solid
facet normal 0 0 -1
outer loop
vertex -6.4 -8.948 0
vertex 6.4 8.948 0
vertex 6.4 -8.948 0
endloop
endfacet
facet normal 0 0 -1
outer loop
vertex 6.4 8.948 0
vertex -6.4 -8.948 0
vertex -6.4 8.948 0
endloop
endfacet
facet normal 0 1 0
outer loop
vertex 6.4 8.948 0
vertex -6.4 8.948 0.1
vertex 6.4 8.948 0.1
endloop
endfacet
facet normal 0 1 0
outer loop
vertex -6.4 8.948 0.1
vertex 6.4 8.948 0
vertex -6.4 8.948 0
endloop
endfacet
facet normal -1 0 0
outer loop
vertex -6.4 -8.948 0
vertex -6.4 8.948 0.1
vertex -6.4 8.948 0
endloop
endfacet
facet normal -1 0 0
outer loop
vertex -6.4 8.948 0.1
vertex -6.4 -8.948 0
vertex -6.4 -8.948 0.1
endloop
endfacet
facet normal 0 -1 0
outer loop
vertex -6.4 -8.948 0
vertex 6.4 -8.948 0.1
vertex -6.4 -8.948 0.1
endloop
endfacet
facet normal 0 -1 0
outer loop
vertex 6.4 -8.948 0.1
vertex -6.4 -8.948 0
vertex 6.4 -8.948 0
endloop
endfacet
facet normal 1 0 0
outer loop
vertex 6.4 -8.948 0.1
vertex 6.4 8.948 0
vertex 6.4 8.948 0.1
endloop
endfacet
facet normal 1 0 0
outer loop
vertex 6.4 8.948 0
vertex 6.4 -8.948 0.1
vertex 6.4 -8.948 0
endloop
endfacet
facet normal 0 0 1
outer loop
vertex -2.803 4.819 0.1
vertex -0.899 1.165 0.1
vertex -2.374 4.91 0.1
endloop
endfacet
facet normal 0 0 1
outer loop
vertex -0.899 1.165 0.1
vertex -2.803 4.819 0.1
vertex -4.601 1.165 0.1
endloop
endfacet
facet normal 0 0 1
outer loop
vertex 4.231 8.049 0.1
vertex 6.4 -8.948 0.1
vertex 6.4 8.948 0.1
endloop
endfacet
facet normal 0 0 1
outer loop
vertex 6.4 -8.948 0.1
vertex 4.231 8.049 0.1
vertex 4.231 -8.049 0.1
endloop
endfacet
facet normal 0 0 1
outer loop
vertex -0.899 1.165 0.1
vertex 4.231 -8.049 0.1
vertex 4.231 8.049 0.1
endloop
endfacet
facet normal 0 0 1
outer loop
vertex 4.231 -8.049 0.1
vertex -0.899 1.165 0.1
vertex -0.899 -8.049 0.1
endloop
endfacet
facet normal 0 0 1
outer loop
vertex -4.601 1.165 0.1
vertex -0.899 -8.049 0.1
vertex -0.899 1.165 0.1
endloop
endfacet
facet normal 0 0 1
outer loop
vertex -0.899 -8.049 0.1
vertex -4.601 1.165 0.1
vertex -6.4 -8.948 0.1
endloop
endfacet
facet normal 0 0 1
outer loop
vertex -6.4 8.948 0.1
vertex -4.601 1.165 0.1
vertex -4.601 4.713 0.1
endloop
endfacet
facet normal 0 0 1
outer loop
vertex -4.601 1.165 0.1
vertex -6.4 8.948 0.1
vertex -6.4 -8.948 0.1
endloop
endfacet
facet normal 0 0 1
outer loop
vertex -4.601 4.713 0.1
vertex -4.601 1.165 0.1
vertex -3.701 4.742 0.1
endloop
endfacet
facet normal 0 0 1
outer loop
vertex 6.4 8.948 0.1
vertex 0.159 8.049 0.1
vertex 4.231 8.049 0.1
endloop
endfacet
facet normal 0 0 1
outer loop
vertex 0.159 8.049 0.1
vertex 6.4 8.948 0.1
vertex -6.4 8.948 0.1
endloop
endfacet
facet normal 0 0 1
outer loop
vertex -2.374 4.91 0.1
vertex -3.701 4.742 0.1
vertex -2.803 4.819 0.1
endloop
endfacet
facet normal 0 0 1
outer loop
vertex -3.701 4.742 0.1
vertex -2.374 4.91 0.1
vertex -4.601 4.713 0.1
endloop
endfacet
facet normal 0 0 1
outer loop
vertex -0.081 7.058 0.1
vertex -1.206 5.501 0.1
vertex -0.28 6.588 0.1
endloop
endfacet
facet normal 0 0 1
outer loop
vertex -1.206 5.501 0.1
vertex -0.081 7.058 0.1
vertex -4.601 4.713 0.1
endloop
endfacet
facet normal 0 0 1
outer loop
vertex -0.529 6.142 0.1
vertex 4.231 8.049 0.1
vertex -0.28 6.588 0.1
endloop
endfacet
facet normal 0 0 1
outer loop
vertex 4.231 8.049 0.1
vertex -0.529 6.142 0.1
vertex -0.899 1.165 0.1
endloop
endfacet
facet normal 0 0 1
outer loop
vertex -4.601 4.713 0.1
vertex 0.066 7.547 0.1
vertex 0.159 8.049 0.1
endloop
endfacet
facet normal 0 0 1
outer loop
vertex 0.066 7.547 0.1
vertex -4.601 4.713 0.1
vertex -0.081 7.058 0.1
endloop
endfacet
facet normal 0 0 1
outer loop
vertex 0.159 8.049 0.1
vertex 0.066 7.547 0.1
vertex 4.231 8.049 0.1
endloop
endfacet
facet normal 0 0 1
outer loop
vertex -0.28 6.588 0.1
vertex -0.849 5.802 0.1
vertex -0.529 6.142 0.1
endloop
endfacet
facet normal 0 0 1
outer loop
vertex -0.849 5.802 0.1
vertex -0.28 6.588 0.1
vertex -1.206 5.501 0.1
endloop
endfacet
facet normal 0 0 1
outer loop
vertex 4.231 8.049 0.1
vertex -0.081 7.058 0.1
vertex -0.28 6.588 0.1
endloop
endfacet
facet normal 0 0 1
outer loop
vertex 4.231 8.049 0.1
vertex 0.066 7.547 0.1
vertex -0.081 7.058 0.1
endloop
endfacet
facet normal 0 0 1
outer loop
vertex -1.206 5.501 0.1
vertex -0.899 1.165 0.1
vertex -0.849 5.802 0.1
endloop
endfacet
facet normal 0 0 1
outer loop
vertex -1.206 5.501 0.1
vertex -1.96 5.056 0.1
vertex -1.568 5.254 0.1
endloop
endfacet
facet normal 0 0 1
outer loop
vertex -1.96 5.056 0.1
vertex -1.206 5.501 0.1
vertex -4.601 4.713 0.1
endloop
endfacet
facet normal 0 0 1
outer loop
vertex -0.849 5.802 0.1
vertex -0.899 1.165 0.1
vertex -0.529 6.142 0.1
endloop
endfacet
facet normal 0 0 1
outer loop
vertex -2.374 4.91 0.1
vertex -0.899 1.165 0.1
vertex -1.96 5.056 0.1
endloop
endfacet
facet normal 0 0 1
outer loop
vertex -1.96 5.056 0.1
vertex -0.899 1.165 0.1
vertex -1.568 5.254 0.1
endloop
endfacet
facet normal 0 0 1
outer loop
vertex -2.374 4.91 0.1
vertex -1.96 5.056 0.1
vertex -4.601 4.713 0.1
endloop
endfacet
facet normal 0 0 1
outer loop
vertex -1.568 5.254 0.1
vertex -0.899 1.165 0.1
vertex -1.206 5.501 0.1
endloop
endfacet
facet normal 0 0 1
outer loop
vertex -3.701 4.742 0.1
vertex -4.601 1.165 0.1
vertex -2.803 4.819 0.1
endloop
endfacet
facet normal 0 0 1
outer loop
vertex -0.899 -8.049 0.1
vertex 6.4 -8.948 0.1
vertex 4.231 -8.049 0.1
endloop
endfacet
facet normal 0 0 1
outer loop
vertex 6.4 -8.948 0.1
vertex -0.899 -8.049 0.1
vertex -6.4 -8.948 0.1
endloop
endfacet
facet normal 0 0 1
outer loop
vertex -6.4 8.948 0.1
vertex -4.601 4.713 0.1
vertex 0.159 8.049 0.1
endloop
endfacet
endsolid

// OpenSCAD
// file: ../p/box5-12.scad
use <../lib.scad>
function ldraw_lib__box5_12() = [
// 0 Box with 5 Faces without Any Edges
// 0 Name: box5-12.dat
// 0 Author: Chris Dee [cwdee]
// 0 !LDRAW_ORG Primitive UPDATE 2009-02
// 0 !LICENSE Licensed under CC BY 2.0 and CC BY 4.0 : see CAreadme.txt
// 
// 0 BFC CERTIFY CCW
  [0,"BFC","CERTIFY"],
  [0,"BFC","CCW"],
// 
// 0 !HISTORY 2009-09-03 [PTadmin] Official Update 2009-02
// 
// 
// 4 16 1 1 1 1 1 -1 -1 1 -1 -1 1 1
  [4,16,1,1,1,1,1,-1,-1,1,-1,-1,1,1],
// 4 16 -1 0 1 1 0 1 1 1 1 -1 1 1
  [4,16,-1,0,1,1,0,1,1,1,1,-1,1,1],
// 4 16 -1 0 -1 -1 0 1 -1 1 1 -1 1 -1
  [4,16,-1,0,-1,-1,0,1,-1,1,1,-1,1,-1],
// 4 16 1 0 -1 -1 0 -1 -1 1 -1 1 1 -1
  [4,16,1,0,-1,-1,0,-1,-1,1,-1,1,1,-1],
// 4 16 1 0 1 1 0 -1 1 1 -1 1 1 1
  [4,16,1,0,1,1,0,-1,1,1,-1,1,1,1],
// 0
];
module ldraw_lib__box5_12(step=0, col=false, unit=2/5, alt=false, line=0.2, solid=!$preview)
    makepoly(ldraw_lib__box5_12(), step=step, col=col, unit=unit, alt=alt, line=line, solid=solid);
ldraw_lib__box5_12(line=0.2);
// main file
use <../lib.scad>
use <../p/box5-12.scad>
function ldraw_lib__197915e() = [
// 0 Sticker  2.2 x  1.6 with White Number "1"
// 0 Name: 197915e.dat
// 0 Author: N. W. Perry [Plastikean]
// 0 !LDRAW_ORG Part UPDATE 2020-03
// 0 !LICENSE Licensed under CC BY 2.0 and CC BY 4.0 : see CAreadme.txt
// 
// 0 BFC CERTIFY CCW
  [0,"BFC","CERTIFY"],
  [0,"BFC","CCW"],
// 
// 0 !KEYWORDS set 5540
// 
// 0 !HISTORY 2020-12-29 [PTadmin] Official Update 2020-03
// 
// 
// 1 16 0 -0.25 0 16 0 0 0 0.25 0 0 0 22.371 box5-12.dat
  [1,16,0,-0.25,0,16,0,0,0,0.25,0,0,0,22.371, ldraw_lib__box5_12()],
// 
// 4 15 -2.248 -0.25 2.912 -5.935 -0.25 12.274 -7.008 -0.25 12.047 -11.503 -0.25 2.912
  [4,15,-2.248,-0.25,2.912,-5.935,-0.25,12.274,-7.008,-0.25,12.047,-11.503,-0.25,2.912],
// 4 16 16 -0.25 -22.371 16 -0.25 22.371 10.578 -0.25 20.122 10.578 -0.25 -20.122
  [4,16,16,-0.25,-22.371,16,-0.25,22.371,10.578,-0.25,20.122,10.578,-0.25,-20.122],
// 4 15 -2.248 -0.25 2.912 -2.248 -0.25 -20.122 10.578 -0.25 -20.122 10.578 -0.25 20.122
  [4,15,-2.248,-0.25,2.912,-2.248,-0.25,-20.122,10.578,-0.25,-20.122,10.578,-0.25,20.122],
// 4 16 -11.503 -0.25 2.912 -16 -0.25 -22.371 -2.248 -0.25 -20.122 -2.248 -0.25 2.912
  [4,16,-11.503,-0.25,2.912,-16,-0.25,-22.371,-2.248,-0.25,-20.122,-2.248,-0.25,2.912],
// 4 16 -16 -0.25 -22.371 -11.503 -0.25 2.912 -11.503 -0.25 11.782 -16 -0.25 22.371
  [4,16,-16,-0.25,-22.371,-11.503,-0.25,2.912,-11.503,-0.25,11.782,-16,-0.25,22.371],
// 3 15 -11.503 -0.25 11.782 -11.503 -0.25 2.912 -9.252 -0.25 11.854
  [3,15,-11.503,-0.25,11.782,-11.503,-0.25,2.912,-9.252,-0.25,11.854],
// 4 16 0.397 -0.25 20.122 10.578 -0.25 20.122 16 -0.25 22.371 -16 -0.25 22.371
  [4,16,0.397,-0.25,20.122,10.578,-0.25,20.122,16,-0.25,22.371,-16,-0.25,22.371],
// 4 16 -11.503 -0.25 11.782 -9.252 -0.25 11.854 -7.008 -0.25 12.047 -5.935 -0.25 12.274
  [4,16,-11.503,-0.25,11.782,-9.252,-0.25,11.854,-7.008,-0.25,12.047,-5.935,-0.25,12.274],
// 4 16 -0.202 -0.25 17.644 -11.503 -0.25 11.782 -3.014 -0.25 13.753 -0.699 -0.25 16.47
  [4,16,-0.202,-0.25,17.644,-11.503,-0.25,11.782,-3.014,-0.25,13.753,-0.699,-0.25,16.47],
// 4 15 -1.322 -0.25 15.356 -2.248 -0.25 2.912 10.578 -0.25 20.122 -0.699 -0.25 16.47
  [4,15,-1.322,-0.25,15.356,-2.248,-0.25,2.912,10.578,-0.25,20.122,-0.699,-0.25,16.47],
// 4 16 0.165 -0.25 18.867 0.397 -0.25 20.122 -11.503 -0.25 11.782 -0.202 -0.25 17.644
  [4,16,0.165,-0.25,18.867,0.397,-0.25,20.122,-11.503,-0.25,11.782,-0.202,-0.25,17.644],
// 3 15 0.397 -0.25 20.122 0.165 -0.25 18.867 10.578 -0.25 20.122
  [3,15,0.397,-0.25,20.122,0.165,-0.25,18.867,10.578,-0.25,20.122],
// 4 16 -2.122 -0.25 14.506 -1.322 -0.25 15.356 -0.699 -0.25 16.47 -3.014 -0.25 13.753
  [4,16,-2.122,-0.25,14.506,-1.322,-0.25,15.356,-0.699,-0.25,16.47,-3.014,-0.25,13.753],
// 3 15 10.578 -0.25 20.122 -0.202 -0.25 17.644 -0.699 -0.25 16.47
  [3,15,10.578,-0.25,20.122,-0.202,-0.25,17.644,-0.699,-0.25,16.47],
// 3 15 10.578 -0.25 20.122 0.165 -0.25 18.867 -0.202 -0.25 17.644
  [3,15,10.578,-0.25,20.122,0.165,-0.25,18.867,-0.202,-0.25,17.644],
// 3 15 -3.014 -0.25 13.753 -2.248 -0.25 2.912 -2.122 -0.25 14.506
  [3,15,-3.014,-0.25,13.753,-2.248,-0.25,2.912,-2.122,-0.25,14.506],
// 4 16 -3.92 -0.25 13.135 -3.014 -0.25 13.753 -11.503 -0.25 11.782 -4.9 -0.25 12.639
  [4,16,-3.92,-0.25,13.135,-3.014,-0.25,13.753,-11.503,-0.25,11.782,-4.9,-0.25,12.639],
// 3 15 -2.122 -0.25 14.506 -2.248 -0.25 2.912 -1.322 -0.25 15.356
  [3,15,-2.122,-0.25,14.506,-2.248,-0.25,2.912,-1.322,-0.25,15.356],
// 3 15 -5.935 -0.25 12.274 -2.248 -0.25 2.912 -4.9 -0.25 12.639
  [3,15,-5.935,-0.25,12.274,-2.248,-0.25,2.912,-4.9,-0.25,12.639],
// 3 15 -4.9 -0.25 12.639 -2.248 -0.25 2.912 -3.92 -0.25 13.135
  [3,15,-4.9,-0.25,12.639,-2.248,-0.25,2.912,-3.92,-0.25,13.135],
// 3 16 -5.935 -0.25 12.274 -4.9 -0.25 12.639 -11.503 -0.25 11.782
  [3,16,-5.935,-0.25,12.274,-4.9,-0.25,12.639,-11.503,-0.25,11.782],
// 3 15 -3.92 -0.25 13.135 -2.248 -0.25 2.912 -3.014 -0.25 13.753
  [3,15,-3.92,-0.25,13.135,-2.248,-0.25,2.912,-3.014,-0.25,13.753],
// 3 15 -9.252 -0.25 11.854 -11.503 -0.25 2.912 -7.008 -0.25 12.047
  [3,15,-9.252,-0.25,11.854,-11.503,-0.25,2.912,-7.008,-0.25,12.047],
// 4 16 16 -0.25 -22.371 10.578 -0.25 -20.122 -2.248 -0.25 -20.122 -16 -0.25 -22.371
  [4,16,16,-0.25,-22.371,10.578,-0.25,-20.122,-2.248,-0.25,-20.122,-16,-0.25,-22.371],
// 3 16 -16 -0.25 22.371 -11.503 -0.25 11.782 0.397 -0.25 20.122
  [3,16,-16,-0.25,22.371,-11.503,-0.25,11.782,0.397,-0.25,20.122],
];
module ldraw_lib__197915e(step=0, col=false, unit=2/5, alt=false, line=0.2, solid=!$preview)
    makepoly(ldraw_lib__197915e(), step=step, col=col, unit=unit, alt=alt, line=line, solid=solid);
ldraw_lib__197915e(line=0.2);
